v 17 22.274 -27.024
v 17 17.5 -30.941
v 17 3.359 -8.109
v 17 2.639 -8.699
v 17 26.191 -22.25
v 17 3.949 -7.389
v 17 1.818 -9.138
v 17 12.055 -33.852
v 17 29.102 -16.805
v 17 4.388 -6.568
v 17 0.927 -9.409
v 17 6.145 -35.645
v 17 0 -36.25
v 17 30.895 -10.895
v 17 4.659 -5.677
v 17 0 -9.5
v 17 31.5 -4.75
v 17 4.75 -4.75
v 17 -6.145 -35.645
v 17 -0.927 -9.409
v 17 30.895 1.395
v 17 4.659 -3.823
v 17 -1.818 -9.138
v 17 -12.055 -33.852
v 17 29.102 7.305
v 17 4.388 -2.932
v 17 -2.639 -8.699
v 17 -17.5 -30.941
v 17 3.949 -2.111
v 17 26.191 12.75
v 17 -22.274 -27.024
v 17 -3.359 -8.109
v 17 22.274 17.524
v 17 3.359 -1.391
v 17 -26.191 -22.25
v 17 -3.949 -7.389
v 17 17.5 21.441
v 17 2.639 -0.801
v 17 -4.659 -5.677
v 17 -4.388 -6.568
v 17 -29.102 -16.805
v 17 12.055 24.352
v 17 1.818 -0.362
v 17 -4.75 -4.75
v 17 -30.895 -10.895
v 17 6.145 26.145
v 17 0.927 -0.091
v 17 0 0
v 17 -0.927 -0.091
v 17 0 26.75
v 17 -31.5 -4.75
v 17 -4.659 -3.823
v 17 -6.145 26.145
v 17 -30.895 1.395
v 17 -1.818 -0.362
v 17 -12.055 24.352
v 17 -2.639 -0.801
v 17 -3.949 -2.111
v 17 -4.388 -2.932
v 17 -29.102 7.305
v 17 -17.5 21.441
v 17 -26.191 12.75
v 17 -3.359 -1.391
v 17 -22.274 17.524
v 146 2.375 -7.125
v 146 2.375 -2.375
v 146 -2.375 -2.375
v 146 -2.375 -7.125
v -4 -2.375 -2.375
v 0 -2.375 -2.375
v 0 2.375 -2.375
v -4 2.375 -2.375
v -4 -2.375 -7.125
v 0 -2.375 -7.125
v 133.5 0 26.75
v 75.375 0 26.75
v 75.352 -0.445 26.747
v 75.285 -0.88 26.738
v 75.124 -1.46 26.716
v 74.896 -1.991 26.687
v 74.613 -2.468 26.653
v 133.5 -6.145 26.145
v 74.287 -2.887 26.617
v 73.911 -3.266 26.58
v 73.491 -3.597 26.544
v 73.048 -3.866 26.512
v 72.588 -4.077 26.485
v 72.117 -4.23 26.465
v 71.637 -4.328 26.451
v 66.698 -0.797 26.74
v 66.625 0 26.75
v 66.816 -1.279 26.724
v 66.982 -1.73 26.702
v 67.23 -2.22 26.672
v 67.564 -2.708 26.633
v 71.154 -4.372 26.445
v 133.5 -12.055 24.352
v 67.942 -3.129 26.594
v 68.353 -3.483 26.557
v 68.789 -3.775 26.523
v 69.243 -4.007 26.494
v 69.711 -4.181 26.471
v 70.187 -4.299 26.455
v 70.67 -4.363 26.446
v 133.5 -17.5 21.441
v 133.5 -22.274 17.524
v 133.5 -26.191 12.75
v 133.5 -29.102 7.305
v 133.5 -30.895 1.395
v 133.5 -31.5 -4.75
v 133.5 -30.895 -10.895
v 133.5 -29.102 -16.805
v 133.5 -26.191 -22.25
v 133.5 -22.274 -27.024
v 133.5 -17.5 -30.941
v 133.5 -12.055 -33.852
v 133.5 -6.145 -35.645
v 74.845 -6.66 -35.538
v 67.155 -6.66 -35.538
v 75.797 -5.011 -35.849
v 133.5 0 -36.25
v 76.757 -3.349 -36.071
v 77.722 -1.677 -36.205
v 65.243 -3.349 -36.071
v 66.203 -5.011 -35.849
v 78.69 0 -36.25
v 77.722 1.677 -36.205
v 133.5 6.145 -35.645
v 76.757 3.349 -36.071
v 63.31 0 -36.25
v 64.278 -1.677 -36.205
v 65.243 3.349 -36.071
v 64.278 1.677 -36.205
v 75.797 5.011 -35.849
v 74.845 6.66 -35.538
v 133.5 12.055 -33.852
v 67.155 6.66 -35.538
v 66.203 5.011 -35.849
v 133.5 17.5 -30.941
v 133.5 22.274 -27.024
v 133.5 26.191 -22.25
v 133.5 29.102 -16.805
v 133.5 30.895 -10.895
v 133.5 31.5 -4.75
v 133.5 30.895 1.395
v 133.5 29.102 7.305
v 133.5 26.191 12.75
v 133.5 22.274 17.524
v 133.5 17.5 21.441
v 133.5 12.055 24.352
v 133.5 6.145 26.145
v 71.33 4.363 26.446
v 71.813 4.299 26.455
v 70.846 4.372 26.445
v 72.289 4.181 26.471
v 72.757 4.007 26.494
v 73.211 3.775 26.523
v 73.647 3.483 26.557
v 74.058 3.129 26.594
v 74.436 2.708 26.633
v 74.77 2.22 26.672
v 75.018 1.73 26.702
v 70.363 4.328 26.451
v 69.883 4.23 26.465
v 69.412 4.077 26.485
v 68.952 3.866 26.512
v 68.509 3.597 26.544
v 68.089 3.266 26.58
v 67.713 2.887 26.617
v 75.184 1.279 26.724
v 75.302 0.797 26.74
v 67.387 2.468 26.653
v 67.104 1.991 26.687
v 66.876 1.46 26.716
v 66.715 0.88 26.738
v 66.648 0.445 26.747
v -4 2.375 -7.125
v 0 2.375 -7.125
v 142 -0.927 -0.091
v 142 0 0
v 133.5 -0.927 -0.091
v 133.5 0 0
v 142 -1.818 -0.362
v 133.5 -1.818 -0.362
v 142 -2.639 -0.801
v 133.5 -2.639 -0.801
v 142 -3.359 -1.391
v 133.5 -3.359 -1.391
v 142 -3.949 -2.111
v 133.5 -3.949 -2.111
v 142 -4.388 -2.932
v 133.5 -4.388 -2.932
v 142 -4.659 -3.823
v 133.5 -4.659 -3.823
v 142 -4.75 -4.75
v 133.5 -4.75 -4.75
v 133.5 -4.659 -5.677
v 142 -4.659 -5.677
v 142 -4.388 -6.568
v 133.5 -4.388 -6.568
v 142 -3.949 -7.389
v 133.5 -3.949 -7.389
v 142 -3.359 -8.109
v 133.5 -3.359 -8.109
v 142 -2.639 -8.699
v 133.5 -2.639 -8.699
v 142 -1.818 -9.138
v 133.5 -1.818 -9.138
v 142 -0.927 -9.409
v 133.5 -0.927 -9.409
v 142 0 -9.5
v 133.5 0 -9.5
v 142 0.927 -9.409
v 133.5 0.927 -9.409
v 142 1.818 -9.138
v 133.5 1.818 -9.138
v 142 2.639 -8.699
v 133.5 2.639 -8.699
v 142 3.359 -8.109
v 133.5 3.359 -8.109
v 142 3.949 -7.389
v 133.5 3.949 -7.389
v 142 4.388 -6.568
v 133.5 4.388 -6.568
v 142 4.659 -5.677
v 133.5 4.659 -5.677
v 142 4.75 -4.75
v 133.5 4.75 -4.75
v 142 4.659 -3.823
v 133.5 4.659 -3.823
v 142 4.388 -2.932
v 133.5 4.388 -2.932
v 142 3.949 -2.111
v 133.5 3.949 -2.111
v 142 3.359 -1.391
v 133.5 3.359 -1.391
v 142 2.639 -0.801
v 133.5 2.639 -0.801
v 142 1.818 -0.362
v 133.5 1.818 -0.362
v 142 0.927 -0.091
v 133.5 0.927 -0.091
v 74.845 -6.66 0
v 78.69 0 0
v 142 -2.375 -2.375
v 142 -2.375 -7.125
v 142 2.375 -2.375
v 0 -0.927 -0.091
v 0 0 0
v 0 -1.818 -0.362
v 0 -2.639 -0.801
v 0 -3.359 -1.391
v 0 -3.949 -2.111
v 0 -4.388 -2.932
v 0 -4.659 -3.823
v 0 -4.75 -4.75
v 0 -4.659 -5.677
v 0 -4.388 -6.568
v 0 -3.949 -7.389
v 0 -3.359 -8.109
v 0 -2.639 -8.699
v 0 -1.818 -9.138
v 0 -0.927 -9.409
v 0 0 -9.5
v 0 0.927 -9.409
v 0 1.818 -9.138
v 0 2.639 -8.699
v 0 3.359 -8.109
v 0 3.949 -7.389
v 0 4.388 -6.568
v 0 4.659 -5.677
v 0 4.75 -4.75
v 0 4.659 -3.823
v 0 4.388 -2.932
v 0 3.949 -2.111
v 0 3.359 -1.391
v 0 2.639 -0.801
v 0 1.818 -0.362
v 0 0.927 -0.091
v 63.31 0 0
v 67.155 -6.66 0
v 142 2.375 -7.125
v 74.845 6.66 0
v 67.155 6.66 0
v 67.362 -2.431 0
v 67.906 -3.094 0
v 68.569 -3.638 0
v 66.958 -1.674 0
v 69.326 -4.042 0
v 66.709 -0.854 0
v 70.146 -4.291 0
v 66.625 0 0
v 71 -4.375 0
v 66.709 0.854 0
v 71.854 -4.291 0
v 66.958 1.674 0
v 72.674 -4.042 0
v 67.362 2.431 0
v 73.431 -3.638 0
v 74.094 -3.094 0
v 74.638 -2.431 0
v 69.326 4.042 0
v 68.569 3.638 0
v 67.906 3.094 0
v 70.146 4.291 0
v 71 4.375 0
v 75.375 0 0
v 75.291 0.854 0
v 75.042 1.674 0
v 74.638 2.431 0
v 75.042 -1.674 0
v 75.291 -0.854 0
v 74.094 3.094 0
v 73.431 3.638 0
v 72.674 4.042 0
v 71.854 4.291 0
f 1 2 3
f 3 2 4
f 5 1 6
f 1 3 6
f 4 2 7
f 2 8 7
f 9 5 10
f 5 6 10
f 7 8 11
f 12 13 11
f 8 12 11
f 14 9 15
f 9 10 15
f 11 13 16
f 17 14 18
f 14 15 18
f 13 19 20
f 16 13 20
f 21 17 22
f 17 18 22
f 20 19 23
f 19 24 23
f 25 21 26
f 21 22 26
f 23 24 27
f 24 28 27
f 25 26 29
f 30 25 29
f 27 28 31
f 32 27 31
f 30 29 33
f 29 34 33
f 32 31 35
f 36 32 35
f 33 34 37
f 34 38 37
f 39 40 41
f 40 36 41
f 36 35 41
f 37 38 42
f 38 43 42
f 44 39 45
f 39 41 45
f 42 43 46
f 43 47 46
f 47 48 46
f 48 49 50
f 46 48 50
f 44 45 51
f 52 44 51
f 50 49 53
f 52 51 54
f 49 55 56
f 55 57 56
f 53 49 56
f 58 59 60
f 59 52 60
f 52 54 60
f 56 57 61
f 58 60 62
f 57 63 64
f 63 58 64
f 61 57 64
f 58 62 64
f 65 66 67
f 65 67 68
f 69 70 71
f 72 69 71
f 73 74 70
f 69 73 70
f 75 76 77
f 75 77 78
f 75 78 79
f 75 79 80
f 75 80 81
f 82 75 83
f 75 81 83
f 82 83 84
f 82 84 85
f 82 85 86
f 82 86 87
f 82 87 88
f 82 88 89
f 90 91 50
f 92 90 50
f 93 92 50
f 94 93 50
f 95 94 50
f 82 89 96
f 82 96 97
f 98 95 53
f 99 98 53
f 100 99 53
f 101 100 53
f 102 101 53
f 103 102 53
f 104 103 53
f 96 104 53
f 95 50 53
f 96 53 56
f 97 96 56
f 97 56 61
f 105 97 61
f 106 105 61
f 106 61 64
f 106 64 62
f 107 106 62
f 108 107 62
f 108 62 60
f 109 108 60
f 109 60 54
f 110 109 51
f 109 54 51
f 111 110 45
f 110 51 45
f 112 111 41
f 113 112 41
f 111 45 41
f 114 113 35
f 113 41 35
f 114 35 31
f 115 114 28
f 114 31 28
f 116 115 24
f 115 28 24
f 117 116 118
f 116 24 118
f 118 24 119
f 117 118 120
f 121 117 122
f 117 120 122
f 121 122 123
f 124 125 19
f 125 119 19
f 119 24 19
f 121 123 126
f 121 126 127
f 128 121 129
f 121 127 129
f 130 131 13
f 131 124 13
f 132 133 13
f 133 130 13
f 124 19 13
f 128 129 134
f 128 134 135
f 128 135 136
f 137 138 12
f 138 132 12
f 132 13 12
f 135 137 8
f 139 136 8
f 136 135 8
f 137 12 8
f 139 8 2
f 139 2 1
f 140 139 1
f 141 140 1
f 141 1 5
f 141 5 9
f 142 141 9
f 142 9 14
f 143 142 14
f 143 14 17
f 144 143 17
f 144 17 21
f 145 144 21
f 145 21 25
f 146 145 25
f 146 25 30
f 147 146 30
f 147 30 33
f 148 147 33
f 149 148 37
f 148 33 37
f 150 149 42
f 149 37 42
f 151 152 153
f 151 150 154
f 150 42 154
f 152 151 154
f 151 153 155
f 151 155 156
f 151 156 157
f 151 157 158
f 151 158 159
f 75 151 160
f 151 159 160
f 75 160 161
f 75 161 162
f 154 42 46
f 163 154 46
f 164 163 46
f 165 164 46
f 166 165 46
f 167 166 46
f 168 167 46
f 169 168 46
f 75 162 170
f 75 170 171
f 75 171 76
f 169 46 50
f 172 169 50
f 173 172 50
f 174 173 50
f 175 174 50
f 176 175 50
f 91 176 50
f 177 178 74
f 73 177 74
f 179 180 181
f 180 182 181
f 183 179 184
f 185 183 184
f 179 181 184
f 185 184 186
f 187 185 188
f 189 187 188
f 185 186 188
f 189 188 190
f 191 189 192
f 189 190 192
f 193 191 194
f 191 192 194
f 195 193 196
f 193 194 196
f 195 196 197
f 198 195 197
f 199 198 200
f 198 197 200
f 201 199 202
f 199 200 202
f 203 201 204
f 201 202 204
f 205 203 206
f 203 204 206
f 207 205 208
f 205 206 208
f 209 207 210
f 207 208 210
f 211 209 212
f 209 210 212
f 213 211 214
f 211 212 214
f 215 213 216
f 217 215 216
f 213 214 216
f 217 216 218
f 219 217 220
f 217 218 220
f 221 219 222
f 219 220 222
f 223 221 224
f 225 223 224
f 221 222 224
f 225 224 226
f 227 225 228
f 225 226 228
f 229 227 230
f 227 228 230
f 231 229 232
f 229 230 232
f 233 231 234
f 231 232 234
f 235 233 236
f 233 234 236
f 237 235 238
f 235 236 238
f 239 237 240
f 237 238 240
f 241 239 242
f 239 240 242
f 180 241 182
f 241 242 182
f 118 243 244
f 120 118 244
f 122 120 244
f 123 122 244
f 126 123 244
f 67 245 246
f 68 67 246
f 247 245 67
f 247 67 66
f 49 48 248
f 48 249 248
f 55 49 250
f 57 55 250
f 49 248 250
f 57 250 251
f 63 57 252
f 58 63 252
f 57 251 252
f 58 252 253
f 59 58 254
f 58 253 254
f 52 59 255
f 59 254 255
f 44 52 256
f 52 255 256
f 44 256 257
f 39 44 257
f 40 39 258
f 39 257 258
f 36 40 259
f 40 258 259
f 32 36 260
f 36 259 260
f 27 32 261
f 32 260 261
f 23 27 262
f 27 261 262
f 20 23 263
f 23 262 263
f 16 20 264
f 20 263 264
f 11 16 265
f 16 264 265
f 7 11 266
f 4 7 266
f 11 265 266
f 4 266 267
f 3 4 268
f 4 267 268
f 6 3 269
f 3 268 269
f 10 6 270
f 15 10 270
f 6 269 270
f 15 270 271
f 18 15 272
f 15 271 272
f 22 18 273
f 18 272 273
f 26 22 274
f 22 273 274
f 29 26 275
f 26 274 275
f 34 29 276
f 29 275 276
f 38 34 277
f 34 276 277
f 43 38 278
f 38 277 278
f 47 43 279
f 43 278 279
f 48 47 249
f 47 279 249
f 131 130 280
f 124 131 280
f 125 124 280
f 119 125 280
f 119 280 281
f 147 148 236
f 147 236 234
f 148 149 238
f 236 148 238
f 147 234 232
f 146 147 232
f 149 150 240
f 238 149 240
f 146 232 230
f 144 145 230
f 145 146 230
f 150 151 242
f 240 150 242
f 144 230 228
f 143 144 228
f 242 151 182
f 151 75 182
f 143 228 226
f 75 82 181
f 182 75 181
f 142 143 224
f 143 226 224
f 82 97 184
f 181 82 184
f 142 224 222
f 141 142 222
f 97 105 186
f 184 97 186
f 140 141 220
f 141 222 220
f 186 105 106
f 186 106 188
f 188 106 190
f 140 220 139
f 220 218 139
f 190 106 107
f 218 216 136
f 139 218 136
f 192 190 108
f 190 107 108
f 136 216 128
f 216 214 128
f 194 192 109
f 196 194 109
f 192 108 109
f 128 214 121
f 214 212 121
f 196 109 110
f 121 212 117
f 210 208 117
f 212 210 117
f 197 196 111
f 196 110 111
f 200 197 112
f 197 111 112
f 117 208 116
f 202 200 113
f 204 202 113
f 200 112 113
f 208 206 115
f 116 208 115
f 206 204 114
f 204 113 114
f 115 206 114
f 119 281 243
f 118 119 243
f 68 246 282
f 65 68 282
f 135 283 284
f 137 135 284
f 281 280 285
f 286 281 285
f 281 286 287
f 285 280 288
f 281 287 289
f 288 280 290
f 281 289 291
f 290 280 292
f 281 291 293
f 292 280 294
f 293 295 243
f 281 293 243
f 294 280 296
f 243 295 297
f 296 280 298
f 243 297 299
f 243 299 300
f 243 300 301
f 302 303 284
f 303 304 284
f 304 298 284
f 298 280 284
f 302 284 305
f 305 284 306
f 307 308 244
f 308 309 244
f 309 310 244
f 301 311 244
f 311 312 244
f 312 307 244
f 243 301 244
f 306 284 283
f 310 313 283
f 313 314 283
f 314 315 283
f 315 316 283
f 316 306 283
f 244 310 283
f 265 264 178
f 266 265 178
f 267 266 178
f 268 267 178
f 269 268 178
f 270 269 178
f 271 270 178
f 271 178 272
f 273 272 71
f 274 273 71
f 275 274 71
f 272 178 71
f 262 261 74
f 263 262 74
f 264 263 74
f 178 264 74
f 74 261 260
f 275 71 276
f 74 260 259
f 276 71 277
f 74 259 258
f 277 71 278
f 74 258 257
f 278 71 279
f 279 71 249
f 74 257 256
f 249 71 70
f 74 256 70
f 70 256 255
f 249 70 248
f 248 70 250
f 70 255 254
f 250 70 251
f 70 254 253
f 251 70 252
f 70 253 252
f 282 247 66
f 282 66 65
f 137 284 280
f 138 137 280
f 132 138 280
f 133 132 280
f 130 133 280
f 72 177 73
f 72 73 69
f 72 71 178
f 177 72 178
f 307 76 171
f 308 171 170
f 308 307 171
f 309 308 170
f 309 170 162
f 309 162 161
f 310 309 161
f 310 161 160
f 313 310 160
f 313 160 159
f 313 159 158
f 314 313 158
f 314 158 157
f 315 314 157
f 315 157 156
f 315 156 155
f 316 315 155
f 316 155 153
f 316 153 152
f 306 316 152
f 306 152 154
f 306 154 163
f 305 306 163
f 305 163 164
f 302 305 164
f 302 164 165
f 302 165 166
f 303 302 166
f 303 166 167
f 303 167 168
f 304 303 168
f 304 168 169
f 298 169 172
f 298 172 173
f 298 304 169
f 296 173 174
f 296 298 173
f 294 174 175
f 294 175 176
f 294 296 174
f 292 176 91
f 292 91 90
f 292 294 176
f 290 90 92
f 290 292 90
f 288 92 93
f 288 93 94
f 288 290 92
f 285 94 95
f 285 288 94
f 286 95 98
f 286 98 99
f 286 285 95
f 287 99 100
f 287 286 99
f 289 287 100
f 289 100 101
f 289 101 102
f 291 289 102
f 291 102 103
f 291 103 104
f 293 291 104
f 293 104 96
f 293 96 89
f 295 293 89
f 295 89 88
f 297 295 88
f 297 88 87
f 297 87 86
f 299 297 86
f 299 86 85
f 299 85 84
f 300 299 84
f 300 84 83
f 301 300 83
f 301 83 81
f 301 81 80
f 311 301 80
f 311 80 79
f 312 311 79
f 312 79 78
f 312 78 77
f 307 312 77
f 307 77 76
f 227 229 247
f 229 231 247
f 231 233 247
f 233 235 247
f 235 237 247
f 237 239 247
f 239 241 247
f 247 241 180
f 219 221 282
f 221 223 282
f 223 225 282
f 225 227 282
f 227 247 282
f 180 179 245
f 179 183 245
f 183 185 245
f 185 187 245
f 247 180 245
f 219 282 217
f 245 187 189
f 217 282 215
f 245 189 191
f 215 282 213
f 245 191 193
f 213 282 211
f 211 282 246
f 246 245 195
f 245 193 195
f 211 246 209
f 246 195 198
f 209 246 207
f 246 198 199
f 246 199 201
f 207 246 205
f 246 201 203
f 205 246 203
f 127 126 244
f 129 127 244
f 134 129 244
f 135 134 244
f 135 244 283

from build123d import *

# Parameters (mm, degrees)
ESQUISSE5_W                  = 4.75
ESQUISSE5_H                  = 4.75
BOSS_EXTRU_3_DEPTH           = 4
BOSS_EXTRU_4_DEPTH           = 4
ESQUISSE10_R                 = 4.375
ENL_V_MAT_EXTRU_2_DEPTH      = 50
ENL_V_MAT_EXTRU_3_DEPTH      = 50
ENL_V_MAT_EXTRU_3_DEPTH_BACK = 50
ESQUISSE11_R                 = 4.375


with BuildPart() as part:
    # Esquisse1 → Révolution1 (revolve)
    with BuildSketch(Plane(origin=(0, 0, 0), x_dir=(1, 0, 0), z_dir=(0, 1, 0))):
        Polygon((0, 0), (0, 4.75), (142, 4.75), (142, 0), (133.5, 0), (133.5, -26.75), (17, -26.75), (17, 0), align=None)
    revolve(axis=Axis((0, 0, -4.75), (1, 0, 0)))

    # Esquisse5 → Boss.-Extru.3 (add)
    with BuildSketch(Plane(origin=(142, 0, 0), x_dir=(0, 0, -1), z_dir=(1, 0, 0))):
        with Locations((4.75, 0)):
            Rectangle(ESQUISSE5_W, ESQUISSE5_H)
    extrude(amount=BOSS_EXTRU_3_DEPTH)

    # Esquisse6 → Boss.-Extru.4 (add)
    with BuildSketch(Plane.ZY):
        Polygon((-4.75, 2.375), (-7.125, 2.375), (-7.125, -2.375), (-2.375, -2.375), (-2.375, 2.375), align=None)
    extrude(amount=BOSS_EXTRU_4_DEPTH)

    # Esquisse10 → Enlèv. mat.-Extru.2 (cut)
    with BuildSketch(Plane.XY):
        Polygon((63.31, 0), (67.155, -6.659735355), (74.845, -6.659735355), (78.69, 0), (74.845, 6.659735355), (67.155, 6.659735355), align=None)
        with Locations((71, 0)):
            Circle(ESQUISSE10_R, mode=Mode.SUBTRACT)
    extrude(amount=-ENL_V_MAT_EXTRU_2_DEPTH, mode=Mode.SUBTRACT)

    # Esquisse11 → Enlèv. mat.-Extru.3 (cut, two sides: drawn at the far end of the back side and taken through both)
    with BuildSketch(Plane.XY.offset(-ENL_V_MAT_EXTRU_3_DEPTH_BACK)):
        with Locations((71, 0)):
            Circle(ESQUISSE11_R)
    extrude(amount=ENL_V_MAT_EXTRU_3_DEPTH + ENL_V_MAT_EXTRU_3_DEPTH_BACK, mode=Mode.SUBTRACT)


solid = part.part
